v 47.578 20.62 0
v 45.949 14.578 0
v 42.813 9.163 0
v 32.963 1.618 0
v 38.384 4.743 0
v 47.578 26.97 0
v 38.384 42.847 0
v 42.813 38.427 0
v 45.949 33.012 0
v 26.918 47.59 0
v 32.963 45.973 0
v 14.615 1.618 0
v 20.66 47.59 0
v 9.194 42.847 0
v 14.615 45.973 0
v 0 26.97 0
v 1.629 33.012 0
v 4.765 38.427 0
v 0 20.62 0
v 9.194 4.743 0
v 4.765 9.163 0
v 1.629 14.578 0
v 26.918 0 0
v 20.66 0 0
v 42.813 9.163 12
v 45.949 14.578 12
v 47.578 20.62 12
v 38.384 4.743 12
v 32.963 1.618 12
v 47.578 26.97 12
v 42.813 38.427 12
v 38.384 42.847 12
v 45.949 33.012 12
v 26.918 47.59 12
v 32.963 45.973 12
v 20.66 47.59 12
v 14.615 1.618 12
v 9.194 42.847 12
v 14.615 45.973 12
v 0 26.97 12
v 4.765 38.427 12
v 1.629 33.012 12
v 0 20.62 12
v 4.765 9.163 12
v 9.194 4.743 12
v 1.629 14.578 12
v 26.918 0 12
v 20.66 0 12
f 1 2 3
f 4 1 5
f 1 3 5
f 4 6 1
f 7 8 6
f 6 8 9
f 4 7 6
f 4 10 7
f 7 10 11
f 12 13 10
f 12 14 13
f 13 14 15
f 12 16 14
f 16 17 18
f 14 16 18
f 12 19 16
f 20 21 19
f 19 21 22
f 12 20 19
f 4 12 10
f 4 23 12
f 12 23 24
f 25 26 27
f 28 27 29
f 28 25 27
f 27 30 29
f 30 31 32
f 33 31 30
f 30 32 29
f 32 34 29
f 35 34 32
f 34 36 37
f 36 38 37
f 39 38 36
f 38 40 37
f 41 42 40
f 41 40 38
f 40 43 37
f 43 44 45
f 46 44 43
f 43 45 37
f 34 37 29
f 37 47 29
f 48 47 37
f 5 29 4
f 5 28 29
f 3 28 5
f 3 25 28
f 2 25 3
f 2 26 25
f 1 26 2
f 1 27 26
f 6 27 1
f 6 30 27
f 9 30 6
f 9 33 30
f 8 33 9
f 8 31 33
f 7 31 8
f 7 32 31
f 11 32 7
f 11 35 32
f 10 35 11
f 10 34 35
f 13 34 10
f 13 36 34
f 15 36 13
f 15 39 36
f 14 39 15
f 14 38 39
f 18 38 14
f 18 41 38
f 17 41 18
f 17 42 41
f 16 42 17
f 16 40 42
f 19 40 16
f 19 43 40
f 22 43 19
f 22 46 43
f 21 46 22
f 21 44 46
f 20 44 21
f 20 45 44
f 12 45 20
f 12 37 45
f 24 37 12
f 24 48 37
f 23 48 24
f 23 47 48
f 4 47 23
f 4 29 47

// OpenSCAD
$fn = 32;

// ----------------------------------------------------------------------
// Flat adaptor: double_d, 12 mm thick
// ----------------------------------------------------------------------

// --- parameters (mm) ---
profile_height = 12;      // extrusion height
profile_points = 24;      // points of the closed outline

profile = [[47.578, 26.97], [45.949, 33.012], [42.813, 38.427], [38.384, 42.847], [32.963, 45.973], [26.918, 47.59], [20.66, 47.59], [14.615, 45.973], [9.194, 42.847], [4.765, 38.427], [1.629, 33.012], [0, 26.97], [0, 20.62], [1.629, 14.578], [4.765, 9.163], [9.194, 4.743], [14.615, 1.618], [20.66, 0], [26.918, 0], [32.963, 1.618], [38.384, 4.743], [42.813, 9.163], [45.949, 14.578], [47.578, 20.62]];  // single closed polygon, 24 points, counter clockwise

// --- the one profile operation ---
linear_extrude(height = profile_height) polygon(points = profile);
